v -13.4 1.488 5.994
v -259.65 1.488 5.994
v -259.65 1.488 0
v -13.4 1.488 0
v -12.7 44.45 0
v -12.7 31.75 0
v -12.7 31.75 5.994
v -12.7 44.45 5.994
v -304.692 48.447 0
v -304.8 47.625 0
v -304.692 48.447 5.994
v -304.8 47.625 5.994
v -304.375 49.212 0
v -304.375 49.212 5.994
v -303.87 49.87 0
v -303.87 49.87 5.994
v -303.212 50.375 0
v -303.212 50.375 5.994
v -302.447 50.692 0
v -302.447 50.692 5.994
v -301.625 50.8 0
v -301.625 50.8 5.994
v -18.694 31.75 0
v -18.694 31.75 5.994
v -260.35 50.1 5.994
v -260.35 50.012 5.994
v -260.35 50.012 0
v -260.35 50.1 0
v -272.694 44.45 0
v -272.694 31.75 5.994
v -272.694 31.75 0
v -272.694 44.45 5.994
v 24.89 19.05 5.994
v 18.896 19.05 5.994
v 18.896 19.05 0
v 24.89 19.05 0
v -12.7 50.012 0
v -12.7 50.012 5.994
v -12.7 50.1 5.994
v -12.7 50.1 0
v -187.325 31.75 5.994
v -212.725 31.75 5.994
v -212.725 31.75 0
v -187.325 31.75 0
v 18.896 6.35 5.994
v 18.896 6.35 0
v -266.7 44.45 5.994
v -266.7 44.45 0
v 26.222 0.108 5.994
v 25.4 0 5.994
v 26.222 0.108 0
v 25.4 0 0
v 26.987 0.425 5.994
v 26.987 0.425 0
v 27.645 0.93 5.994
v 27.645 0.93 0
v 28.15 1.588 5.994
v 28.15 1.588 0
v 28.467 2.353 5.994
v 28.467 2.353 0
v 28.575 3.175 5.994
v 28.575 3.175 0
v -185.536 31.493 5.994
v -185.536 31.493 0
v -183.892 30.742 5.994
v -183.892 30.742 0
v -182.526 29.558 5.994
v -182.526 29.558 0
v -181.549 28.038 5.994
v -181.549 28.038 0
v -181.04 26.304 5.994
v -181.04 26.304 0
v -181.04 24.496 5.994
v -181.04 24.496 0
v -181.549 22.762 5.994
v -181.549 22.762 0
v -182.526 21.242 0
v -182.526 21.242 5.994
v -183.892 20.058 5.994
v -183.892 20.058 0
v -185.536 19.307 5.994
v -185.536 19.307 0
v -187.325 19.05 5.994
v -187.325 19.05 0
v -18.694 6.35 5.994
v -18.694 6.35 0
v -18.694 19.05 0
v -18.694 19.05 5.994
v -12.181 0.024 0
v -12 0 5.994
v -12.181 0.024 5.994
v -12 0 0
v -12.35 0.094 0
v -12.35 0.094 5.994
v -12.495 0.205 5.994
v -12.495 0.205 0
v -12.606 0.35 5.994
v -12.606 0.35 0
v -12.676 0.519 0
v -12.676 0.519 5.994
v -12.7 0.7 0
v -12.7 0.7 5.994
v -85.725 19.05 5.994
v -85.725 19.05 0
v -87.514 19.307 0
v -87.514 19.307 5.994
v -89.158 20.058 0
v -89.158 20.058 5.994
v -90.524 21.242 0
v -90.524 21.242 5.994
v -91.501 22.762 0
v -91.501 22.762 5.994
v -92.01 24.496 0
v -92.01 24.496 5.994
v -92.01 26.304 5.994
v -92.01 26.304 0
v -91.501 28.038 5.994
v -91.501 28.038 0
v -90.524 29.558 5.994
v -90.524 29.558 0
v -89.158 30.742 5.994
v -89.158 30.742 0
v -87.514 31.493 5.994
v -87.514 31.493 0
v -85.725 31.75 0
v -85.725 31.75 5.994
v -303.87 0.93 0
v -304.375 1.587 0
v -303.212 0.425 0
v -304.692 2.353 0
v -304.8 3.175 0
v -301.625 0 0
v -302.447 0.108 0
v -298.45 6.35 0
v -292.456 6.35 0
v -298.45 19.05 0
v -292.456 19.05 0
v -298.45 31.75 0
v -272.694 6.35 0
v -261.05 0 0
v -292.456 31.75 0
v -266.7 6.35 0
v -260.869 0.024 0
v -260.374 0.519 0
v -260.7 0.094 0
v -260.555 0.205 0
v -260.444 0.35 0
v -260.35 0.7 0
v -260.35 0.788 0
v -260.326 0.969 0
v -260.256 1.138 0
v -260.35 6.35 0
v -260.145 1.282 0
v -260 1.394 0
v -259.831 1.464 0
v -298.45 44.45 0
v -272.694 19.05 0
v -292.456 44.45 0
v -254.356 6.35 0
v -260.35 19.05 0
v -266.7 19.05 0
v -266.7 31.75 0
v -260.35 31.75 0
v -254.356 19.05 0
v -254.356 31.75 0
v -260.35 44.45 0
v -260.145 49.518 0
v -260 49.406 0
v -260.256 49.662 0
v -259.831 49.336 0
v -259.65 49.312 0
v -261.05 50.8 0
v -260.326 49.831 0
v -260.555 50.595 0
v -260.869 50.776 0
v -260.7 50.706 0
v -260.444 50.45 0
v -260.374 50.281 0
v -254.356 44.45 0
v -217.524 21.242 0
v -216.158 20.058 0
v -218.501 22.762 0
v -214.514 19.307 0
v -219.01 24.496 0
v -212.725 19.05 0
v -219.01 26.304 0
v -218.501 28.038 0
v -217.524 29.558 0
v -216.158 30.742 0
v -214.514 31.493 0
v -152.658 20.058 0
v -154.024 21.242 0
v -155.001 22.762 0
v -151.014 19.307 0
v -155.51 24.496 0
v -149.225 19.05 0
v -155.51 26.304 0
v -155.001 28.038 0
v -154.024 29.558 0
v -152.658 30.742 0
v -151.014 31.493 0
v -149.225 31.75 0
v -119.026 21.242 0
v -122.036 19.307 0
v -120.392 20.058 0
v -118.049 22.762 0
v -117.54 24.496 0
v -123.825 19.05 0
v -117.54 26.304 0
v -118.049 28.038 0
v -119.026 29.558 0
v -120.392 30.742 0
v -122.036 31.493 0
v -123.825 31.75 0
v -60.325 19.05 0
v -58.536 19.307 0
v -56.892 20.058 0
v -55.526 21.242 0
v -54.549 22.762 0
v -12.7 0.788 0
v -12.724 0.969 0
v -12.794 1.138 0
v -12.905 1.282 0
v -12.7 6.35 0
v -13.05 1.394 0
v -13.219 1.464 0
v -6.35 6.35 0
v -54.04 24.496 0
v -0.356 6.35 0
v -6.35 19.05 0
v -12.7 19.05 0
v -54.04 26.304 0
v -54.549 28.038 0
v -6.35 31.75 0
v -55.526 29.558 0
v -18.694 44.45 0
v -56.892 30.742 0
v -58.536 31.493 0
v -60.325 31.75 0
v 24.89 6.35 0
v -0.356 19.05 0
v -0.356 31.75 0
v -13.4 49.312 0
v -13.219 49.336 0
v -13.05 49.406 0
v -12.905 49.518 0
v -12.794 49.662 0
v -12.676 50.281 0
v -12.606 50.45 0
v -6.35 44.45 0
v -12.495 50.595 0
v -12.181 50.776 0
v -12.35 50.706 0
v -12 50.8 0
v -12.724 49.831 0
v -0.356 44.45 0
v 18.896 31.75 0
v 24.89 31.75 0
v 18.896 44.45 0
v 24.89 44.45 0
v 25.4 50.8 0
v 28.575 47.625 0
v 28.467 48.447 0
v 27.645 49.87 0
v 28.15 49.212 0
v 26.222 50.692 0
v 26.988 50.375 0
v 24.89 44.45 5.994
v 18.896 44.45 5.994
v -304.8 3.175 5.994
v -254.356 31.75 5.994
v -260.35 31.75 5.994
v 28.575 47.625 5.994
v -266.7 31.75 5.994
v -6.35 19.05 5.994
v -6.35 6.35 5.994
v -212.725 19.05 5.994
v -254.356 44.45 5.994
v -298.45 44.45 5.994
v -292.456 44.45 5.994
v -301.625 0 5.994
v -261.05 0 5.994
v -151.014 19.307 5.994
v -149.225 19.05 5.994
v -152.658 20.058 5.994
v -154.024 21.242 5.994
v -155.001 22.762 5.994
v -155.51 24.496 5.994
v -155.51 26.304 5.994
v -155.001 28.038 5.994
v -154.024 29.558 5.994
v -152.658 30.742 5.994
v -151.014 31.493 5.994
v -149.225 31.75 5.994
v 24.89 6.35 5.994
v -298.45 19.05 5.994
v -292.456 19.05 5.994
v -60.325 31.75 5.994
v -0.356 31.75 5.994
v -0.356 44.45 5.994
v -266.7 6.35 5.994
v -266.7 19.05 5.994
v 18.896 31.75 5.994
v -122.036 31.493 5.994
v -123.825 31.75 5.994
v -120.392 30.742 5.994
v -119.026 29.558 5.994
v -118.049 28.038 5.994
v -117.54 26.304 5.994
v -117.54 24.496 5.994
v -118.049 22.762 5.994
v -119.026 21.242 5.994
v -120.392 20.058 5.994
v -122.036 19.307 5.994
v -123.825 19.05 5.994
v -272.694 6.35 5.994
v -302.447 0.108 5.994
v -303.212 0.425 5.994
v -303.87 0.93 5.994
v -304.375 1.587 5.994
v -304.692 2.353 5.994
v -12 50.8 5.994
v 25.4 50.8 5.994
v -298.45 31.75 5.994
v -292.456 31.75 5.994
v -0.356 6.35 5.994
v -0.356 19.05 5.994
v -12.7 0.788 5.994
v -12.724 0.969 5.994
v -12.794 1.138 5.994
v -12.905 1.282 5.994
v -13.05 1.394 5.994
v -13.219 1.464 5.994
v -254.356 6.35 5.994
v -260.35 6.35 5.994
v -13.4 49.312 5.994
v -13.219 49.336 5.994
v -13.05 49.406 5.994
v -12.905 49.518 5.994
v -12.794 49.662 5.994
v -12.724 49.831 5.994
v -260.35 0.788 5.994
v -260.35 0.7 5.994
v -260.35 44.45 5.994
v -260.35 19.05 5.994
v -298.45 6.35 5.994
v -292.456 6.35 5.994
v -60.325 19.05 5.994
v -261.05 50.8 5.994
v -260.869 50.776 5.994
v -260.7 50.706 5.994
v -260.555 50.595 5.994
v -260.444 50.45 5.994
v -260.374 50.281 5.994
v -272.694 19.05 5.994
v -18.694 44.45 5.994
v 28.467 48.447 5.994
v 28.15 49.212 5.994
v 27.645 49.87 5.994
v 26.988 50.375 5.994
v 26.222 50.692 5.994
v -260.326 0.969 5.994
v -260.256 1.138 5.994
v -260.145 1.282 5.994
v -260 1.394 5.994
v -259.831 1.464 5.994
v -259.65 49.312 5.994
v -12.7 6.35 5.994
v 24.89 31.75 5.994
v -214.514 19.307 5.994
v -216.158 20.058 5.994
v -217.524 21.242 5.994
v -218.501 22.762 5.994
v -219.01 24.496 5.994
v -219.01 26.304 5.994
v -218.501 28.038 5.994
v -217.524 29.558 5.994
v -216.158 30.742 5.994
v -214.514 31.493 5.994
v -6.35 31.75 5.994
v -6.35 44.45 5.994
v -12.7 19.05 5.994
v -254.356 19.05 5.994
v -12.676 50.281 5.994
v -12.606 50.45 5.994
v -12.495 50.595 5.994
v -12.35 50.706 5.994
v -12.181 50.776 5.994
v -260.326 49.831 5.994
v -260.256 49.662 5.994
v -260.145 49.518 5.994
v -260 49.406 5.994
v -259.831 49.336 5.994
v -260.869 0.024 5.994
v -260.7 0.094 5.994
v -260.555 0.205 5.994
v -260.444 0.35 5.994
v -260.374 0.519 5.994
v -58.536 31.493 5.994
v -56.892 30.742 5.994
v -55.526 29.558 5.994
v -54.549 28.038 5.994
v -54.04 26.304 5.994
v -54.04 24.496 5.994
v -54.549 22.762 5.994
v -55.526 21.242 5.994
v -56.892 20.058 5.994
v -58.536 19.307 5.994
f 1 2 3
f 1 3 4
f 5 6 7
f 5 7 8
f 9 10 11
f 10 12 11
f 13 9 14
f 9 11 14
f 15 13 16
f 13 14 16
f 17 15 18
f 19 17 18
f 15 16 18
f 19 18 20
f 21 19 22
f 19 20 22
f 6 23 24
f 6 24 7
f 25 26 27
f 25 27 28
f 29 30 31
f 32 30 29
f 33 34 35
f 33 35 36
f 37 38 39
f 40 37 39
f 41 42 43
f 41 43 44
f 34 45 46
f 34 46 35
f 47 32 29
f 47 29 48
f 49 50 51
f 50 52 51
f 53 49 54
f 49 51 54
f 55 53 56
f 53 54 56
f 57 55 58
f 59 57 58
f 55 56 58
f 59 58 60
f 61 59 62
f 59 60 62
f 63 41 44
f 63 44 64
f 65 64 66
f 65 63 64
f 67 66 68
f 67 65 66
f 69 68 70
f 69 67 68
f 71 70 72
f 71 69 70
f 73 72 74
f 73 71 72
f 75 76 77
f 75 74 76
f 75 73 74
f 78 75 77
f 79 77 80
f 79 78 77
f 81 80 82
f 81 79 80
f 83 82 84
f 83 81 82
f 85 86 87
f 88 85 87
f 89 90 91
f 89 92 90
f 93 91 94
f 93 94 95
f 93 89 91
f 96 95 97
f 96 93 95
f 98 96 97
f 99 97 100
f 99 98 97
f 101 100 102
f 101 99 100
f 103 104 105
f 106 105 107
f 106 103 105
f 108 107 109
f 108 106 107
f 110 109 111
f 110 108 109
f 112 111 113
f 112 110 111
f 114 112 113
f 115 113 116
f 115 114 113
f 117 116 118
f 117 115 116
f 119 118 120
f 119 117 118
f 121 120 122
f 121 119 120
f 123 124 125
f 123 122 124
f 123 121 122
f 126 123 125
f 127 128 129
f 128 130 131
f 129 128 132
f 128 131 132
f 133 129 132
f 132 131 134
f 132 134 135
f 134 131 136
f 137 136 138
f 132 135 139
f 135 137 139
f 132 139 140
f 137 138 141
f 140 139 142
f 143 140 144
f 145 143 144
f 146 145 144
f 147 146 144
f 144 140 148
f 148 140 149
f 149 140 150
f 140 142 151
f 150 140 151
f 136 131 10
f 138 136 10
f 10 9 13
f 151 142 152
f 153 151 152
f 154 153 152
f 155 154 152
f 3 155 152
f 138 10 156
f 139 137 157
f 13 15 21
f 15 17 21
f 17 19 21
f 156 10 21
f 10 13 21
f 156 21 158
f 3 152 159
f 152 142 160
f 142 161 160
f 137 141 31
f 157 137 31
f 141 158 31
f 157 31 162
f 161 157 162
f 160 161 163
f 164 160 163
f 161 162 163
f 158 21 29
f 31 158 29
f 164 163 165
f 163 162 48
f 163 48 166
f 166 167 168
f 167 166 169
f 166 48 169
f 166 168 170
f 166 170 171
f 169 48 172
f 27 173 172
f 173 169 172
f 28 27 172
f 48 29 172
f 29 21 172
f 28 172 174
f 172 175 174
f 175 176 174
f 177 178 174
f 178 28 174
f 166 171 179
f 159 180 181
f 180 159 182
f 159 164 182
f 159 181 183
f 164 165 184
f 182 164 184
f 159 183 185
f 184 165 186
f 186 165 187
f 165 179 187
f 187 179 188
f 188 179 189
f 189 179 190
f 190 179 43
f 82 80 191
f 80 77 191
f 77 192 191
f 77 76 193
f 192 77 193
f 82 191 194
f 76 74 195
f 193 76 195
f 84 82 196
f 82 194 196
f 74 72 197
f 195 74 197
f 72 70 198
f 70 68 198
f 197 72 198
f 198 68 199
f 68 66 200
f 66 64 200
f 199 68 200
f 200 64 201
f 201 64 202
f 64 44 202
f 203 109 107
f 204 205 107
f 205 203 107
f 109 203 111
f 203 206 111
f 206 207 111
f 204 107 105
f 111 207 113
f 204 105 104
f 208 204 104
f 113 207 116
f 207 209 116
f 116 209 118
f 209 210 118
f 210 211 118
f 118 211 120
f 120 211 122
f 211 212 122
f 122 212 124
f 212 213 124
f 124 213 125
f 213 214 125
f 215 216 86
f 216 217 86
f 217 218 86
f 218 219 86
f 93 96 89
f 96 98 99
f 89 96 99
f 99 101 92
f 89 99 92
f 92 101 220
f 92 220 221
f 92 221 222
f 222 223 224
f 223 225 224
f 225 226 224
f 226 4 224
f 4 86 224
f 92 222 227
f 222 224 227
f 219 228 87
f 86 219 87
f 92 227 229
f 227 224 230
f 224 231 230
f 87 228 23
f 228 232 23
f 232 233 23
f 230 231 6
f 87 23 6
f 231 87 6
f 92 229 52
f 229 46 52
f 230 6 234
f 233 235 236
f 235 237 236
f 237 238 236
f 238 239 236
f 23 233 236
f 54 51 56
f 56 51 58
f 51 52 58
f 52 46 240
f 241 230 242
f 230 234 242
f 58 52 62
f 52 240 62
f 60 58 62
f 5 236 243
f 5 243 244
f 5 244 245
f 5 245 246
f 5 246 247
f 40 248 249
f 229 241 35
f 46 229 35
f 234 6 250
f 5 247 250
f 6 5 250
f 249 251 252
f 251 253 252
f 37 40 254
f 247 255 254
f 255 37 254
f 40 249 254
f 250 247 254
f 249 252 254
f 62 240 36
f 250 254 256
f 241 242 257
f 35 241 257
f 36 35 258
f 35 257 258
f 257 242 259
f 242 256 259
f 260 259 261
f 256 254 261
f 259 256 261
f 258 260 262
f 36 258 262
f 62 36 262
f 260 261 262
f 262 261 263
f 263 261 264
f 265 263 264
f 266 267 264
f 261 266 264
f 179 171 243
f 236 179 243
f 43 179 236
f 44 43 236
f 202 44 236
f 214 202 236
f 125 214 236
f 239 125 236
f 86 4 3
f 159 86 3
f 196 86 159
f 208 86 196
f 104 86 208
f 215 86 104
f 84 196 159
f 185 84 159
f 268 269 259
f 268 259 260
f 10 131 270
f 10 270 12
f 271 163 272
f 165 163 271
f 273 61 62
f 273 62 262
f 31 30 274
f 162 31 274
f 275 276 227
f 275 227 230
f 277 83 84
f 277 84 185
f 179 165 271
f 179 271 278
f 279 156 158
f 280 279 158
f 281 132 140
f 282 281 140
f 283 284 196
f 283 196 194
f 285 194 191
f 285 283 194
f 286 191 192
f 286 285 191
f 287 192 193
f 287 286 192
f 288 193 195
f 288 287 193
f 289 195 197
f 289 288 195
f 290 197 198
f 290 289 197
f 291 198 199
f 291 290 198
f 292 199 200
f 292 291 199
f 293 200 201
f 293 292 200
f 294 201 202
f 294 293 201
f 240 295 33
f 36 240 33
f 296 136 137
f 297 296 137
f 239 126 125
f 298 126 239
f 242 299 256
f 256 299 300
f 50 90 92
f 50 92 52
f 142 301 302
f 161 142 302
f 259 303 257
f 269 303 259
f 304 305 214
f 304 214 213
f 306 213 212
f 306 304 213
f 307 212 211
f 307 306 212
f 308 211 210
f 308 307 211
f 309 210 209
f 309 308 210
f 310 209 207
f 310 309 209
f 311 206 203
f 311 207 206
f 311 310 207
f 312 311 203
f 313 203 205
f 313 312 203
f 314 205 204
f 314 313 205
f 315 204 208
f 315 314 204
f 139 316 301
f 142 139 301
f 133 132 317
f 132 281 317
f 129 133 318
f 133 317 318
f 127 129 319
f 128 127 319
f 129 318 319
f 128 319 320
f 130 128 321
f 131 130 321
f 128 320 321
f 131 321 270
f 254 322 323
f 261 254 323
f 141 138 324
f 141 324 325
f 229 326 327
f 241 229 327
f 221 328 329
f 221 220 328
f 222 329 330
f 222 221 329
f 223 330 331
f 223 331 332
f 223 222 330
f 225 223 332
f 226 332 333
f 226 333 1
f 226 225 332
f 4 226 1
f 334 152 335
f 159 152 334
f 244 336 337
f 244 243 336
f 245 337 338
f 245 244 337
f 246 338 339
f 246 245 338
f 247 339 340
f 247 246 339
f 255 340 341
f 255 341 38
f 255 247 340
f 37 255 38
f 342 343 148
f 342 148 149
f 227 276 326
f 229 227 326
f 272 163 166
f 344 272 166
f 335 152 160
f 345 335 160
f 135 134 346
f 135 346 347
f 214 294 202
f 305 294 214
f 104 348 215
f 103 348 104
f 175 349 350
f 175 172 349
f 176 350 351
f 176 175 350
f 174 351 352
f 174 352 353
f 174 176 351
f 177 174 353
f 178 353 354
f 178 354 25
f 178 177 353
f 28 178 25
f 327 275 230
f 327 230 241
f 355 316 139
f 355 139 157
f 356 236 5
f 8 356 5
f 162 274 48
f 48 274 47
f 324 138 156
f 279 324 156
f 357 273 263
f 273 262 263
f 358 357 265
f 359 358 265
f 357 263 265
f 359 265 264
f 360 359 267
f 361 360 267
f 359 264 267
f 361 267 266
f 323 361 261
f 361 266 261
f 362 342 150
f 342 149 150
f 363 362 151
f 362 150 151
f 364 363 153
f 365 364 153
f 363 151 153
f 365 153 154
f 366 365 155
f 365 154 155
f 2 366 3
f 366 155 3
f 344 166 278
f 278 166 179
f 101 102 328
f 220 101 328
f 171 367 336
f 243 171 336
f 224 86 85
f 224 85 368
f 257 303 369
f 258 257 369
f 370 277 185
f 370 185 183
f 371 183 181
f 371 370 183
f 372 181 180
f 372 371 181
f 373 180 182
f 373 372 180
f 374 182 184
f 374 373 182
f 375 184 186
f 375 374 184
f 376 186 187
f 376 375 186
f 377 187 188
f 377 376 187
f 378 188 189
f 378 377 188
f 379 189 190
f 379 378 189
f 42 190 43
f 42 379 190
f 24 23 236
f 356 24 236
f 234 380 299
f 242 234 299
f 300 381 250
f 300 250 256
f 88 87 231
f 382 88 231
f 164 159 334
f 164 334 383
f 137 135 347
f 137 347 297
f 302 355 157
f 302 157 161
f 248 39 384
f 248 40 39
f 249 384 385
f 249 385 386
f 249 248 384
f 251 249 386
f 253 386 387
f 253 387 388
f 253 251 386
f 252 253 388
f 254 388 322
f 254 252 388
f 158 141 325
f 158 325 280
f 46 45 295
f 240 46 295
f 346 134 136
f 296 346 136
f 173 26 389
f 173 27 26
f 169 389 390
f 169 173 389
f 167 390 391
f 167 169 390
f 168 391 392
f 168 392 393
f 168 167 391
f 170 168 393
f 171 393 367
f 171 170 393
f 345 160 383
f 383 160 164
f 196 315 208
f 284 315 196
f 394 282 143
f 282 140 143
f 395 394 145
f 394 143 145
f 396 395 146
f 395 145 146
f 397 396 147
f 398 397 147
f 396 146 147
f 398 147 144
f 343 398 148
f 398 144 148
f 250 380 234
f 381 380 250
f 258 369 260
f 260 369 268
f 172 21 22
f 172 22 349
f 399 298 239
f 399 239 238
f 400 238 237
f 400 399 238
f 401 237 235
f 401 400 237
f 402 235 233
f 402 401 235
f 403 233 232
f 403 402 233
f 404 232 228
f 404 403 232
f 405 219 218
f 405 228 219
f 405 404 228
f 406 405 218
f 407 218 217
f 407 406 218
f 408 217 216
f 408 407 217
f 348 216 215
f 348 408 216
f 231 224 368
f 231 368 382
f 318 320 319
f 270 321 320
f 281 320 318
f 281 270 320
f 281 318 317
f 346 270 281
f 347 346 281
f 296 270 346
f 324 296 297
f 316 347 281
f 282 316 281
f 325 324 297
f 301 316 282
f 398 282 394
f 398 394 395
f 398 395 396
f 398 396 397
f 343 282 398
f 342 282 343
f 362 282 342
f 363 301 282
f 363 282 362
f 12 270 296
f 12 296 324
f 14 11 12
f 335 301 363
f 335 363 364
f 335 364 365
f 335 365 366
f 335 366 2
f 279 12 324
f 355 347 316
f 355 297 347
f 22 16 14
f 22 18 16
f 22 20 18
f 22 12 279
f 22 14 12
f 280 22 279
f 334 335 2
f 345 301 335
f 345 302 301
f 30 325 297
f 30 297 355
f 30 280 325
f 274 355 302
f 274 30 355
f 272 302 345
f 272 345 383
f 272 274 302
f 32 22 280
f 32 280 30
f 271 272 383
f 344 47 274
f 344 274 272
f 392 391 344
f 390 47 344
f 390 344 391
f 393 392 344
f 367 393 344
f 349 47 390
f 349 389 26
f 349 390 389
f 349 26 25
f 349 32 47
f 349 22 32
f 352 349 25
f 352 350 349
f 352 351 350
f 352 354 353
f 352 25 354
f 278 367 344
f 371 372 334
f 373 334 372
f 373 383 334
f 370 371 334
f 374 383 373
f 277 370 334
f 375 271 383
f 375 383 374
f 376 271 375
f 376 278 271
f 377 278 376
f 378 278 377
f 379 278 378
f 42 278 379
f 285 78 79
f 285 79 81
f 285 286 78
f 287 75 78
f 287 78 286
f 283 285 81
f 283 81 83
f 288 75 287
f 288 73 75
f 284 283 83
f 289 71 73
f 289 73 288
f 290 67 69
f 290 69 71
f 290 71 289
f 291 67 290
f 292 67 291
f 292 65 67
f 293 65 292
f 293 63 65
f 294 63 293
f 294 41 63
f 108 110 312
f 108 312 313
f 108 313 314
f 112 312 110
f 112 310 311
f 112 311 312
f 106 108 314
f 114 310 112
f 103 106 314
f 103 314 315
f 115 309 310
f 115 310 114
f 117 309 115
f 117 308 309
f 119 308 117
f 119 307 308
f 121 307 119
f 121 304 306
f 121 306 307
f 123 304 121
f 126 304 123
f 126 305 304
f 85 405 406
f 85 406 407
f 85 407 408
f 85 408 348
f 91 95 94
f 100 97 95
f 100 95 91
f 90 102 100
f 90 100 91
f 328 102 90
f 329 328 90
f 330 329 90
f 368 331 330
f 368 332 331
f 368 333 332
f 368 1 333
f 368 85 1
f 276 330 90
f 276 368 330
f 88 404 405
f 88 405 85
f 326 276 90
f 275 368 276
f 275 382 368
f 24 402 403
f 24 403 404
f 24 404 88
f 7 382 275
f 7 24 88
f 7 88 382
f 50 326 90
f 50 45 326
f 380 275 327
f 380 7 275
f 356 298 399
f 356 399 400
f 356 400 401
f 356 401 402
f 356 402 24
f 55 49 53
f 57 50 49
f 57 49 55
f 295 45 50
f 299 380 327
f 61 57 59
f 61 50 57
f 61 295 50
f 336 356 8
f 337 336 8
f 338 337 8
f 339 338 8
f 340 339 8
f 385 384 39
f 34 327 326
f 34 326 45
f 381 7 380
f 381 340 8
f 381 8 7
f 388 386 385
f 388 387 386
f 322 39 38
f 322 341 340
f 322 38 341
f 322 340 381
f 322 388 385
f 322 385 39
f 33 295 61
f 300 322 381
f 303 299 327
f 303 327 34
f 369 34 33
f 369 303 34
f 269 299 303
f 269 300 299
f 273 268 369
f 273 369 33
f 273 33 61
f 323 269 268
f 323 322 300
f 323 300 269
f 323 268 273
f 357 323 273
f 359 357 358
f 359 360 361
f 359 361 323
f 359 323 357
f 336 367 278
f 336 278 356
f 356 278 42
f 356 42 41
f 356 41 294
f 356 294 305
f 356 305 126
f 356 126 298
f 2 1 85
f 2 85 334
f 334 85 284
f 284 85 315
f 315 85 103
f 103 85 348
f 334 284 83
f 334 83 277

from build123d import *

# Parameters (mm, degrees)
SKETCH1_W           = 304.8
SKETCH1_H           = 50.8
SKETCH1_W_2         = 5.9944
SKETCH1_H_2         = 12.7
BOSS_EXTRUDE1_DEPTH = 5.9944
SKETCH3_W           = 247.65
SKETCH3_H           = 1.4875
CUT_EXTRUDE3_DEPTH  = 6.9944
FILLET4_R           = 0.7
SKETCH4_W           = 28.575
SKETCH4_H           = 50.8
BOSS_EXTRUDE2_DEPTH = 5.9944
SKETCH5_W           = 5.9944
SKETCH5_H           = 12.7
CUT_EXTRUDE4_DEPTH  = 6.9944
FILLET5_R           = 3.175
CUT_EXTRUDE5_DEPTH  = 6.9944
SKETCH7_W           = 5.9944
SKETCH7_H           = 12.7
CUT_EXTRUDE6_DEPTH  = 6.9944


with BuildPart() as part:
    # Sketch1 → Boss-Extrude1 (new body)
    with BuildSketch(Plane.XY):
        with Locations((-152.4, 25.4)):
            Rectangle(SKETCH1_W, SKETCH1_H)
        with Locations((-15.6972, 12.7)):
            Rectangle(SKETCH1_W_2, SKETCH1_H_2, mode=Mode.SUBTRACT)
        with Locations((-15.6972, 38.1)):
            Rectangle(SKETCH1_W_2, SKETCH1_H_2, mode=Mode.SUBTRACT)
        with Locations((-257.3528, 38.1)):
            Rectangle(SKETCH1_W_2, SKETCH1_H_2, mode=Mode.SUBTRACT)
        with Locations((-257.3528, 12.7)):
            Rectangle(SKETCH1_W_2, SKETCH1_H_2, mode=Mode.SUBTRACT)
        with Locations((-295.4528, 12.7)):
            Rectangle(SKETCH1_W_2, SKETCH1_H_2, mode=Mode.SUBTRACT)
        with Locations((-295.4528, 38.1)):
            Rectangle(SKETCH1_W_2, SKETCH1_H_2, mode=Mode.SUBTRACT)
    extrude(amount=BOSS_EXTRUDE1_DEPTH)

    # Sketch3 → Cut-Extrude3 (cut, through all)
    with BuildSketch(Plane.XY.offset(5.9944)):
        with Locations((-136.525, 50.05625)):
            Rectangle(SKETCH3_W, SKETCH3_H)
        with Locations((-136.525, 0.74375)):
            Rectangle(SKETCH3_W, SKETCH3_H)
    extrude(amount=-CUT_EXTRUDE3_DEPTH, mode=Mode.SUBTRACT)

    # Fillet4
    fillet4_edges = [part.edges().sort_by_distance(p)[0] for p in [
        (-260.35, 49.3125, 2.9972),
        (-260.35, 50.8, 2.9972),
        (-12.7, 50.8, 2.9972),
        (-12.7, 49.3125, 2.9972),
        (-12.7, 0, 2.9972),
        (-260.35, 0, 2.9972),
        (-260.35, 1.4875, 2.9972),
        (-12.7, 1.4875, 2.9972),
    ]]
    fillet(fillet4_edges, radius=FILLET4_R)

    # Sketch4 → Boss-Extrude2 (add)
    with BuildSketch(Plane.XY.offset(5.9944)):
        with Locations((14.2875, 25.4)):
            Rectangle(SKETCH4_W, SKETCH4_H)
    extrude(amount=-BOSS_EXTRUDE2_DEPTH)

    # Sketch5 → Cut-Extrude4 (cut, through all)
    with BuildSketch(Plane.XY.offset(5.9944)):
        with Locations((21.893276, 38.1)):
            Rectangle(SKETCH5_W, SKETCH5_H)
        with Locations((21.893276, 12.7)):
            Rectangle(SKETCH5_W, SKETCH5_H)
    extrude(amount=-CUT_EXTRUDE4_DEPTH, mode=Mode.SUBTRACT)

    # Fillet5
    fillet5_edges = [part.edges().sort_by_distance(p)[0] for p in [
        (28.575, 50.8, 2.9972),
        (28.575, 0, 2.9972),
        (-304.8, 0, 2.9972),
        (-304.8, 50.8, 2.9972),
    ]]
    fillet(fillet5_edges, radius=FILLET5_R)

    # Sketch6 → Cut-Extrude5 (cut, through all)
    with BuildSketch(Plane.XY.offset(5.9944)):
        with BuildLine():
            Line((-123.825, 19.05), (-149.225, 19.05))
            ThreePointArc((-149.225, 19.05), (-155.575, 25.4), (-149.225, 31.75))
            Line((-149.225, 31.75), (-123.825, 31.75))
            ThreePointArc((-123.825, 31.75), (-117.475, 25.4), (-123.825, 19.05))
        make_face()
        with BuildLine():
            Line((-60.325, 19.05), (-85.725, 19.05))
            ThreePointArc((-85.725, 19.05), (-92.075, 25.4), (-85.725, 31.75))
            Line((-85.725, 31.75), (-60.325, 31.75))
            ThreePointArc((-60.325, 31.75), (-53.975, 25.4), (-60.325, 19.05))
        make_face()
        with BuildLine():
            Line((-187.325, 19.05), (-212.725, 19.05))
            ThreePointArc((-212.725, 19.05), (-219.075, 25.4), (-212.725, 31.75))
            Line((-212.725, 31.75), (-187.325, 31.75))
            ThreePointArc((-187.325, 31.75), (-180.975, 25.4), (-187.325, 19.05))
        make_face()
    extrude(amount=-CUT_EXTRUDE5_DEPTH, mode=Mode.SUBTRACT)

    # Sketch7 → Cut-Extrude6 (cut, through all)
    with BuildSketch(Plane.XY.offset(5.9944)):
        with Locations((-269.6972, 38.1)):
            Rectangle(SKETCH7_W, SKETCH7_H)
        with Locations((-3.3528, 38.1)):
            Rectangle(SKETCH7_W, SKETCH7_H)
        with Locations((-269.6972, 12.7)):
            Rectangle(SKETCH7_W, SKETCH7_H)
        with Locations((-3.3528, 12.7)):
            Rectangle(SKETCH7_W, SKETCH7_H)
    extrude(amount=-CUT_EXTRUDE6_DEPTH, mode=Mode.SUBTRACT)


solid = part.part
